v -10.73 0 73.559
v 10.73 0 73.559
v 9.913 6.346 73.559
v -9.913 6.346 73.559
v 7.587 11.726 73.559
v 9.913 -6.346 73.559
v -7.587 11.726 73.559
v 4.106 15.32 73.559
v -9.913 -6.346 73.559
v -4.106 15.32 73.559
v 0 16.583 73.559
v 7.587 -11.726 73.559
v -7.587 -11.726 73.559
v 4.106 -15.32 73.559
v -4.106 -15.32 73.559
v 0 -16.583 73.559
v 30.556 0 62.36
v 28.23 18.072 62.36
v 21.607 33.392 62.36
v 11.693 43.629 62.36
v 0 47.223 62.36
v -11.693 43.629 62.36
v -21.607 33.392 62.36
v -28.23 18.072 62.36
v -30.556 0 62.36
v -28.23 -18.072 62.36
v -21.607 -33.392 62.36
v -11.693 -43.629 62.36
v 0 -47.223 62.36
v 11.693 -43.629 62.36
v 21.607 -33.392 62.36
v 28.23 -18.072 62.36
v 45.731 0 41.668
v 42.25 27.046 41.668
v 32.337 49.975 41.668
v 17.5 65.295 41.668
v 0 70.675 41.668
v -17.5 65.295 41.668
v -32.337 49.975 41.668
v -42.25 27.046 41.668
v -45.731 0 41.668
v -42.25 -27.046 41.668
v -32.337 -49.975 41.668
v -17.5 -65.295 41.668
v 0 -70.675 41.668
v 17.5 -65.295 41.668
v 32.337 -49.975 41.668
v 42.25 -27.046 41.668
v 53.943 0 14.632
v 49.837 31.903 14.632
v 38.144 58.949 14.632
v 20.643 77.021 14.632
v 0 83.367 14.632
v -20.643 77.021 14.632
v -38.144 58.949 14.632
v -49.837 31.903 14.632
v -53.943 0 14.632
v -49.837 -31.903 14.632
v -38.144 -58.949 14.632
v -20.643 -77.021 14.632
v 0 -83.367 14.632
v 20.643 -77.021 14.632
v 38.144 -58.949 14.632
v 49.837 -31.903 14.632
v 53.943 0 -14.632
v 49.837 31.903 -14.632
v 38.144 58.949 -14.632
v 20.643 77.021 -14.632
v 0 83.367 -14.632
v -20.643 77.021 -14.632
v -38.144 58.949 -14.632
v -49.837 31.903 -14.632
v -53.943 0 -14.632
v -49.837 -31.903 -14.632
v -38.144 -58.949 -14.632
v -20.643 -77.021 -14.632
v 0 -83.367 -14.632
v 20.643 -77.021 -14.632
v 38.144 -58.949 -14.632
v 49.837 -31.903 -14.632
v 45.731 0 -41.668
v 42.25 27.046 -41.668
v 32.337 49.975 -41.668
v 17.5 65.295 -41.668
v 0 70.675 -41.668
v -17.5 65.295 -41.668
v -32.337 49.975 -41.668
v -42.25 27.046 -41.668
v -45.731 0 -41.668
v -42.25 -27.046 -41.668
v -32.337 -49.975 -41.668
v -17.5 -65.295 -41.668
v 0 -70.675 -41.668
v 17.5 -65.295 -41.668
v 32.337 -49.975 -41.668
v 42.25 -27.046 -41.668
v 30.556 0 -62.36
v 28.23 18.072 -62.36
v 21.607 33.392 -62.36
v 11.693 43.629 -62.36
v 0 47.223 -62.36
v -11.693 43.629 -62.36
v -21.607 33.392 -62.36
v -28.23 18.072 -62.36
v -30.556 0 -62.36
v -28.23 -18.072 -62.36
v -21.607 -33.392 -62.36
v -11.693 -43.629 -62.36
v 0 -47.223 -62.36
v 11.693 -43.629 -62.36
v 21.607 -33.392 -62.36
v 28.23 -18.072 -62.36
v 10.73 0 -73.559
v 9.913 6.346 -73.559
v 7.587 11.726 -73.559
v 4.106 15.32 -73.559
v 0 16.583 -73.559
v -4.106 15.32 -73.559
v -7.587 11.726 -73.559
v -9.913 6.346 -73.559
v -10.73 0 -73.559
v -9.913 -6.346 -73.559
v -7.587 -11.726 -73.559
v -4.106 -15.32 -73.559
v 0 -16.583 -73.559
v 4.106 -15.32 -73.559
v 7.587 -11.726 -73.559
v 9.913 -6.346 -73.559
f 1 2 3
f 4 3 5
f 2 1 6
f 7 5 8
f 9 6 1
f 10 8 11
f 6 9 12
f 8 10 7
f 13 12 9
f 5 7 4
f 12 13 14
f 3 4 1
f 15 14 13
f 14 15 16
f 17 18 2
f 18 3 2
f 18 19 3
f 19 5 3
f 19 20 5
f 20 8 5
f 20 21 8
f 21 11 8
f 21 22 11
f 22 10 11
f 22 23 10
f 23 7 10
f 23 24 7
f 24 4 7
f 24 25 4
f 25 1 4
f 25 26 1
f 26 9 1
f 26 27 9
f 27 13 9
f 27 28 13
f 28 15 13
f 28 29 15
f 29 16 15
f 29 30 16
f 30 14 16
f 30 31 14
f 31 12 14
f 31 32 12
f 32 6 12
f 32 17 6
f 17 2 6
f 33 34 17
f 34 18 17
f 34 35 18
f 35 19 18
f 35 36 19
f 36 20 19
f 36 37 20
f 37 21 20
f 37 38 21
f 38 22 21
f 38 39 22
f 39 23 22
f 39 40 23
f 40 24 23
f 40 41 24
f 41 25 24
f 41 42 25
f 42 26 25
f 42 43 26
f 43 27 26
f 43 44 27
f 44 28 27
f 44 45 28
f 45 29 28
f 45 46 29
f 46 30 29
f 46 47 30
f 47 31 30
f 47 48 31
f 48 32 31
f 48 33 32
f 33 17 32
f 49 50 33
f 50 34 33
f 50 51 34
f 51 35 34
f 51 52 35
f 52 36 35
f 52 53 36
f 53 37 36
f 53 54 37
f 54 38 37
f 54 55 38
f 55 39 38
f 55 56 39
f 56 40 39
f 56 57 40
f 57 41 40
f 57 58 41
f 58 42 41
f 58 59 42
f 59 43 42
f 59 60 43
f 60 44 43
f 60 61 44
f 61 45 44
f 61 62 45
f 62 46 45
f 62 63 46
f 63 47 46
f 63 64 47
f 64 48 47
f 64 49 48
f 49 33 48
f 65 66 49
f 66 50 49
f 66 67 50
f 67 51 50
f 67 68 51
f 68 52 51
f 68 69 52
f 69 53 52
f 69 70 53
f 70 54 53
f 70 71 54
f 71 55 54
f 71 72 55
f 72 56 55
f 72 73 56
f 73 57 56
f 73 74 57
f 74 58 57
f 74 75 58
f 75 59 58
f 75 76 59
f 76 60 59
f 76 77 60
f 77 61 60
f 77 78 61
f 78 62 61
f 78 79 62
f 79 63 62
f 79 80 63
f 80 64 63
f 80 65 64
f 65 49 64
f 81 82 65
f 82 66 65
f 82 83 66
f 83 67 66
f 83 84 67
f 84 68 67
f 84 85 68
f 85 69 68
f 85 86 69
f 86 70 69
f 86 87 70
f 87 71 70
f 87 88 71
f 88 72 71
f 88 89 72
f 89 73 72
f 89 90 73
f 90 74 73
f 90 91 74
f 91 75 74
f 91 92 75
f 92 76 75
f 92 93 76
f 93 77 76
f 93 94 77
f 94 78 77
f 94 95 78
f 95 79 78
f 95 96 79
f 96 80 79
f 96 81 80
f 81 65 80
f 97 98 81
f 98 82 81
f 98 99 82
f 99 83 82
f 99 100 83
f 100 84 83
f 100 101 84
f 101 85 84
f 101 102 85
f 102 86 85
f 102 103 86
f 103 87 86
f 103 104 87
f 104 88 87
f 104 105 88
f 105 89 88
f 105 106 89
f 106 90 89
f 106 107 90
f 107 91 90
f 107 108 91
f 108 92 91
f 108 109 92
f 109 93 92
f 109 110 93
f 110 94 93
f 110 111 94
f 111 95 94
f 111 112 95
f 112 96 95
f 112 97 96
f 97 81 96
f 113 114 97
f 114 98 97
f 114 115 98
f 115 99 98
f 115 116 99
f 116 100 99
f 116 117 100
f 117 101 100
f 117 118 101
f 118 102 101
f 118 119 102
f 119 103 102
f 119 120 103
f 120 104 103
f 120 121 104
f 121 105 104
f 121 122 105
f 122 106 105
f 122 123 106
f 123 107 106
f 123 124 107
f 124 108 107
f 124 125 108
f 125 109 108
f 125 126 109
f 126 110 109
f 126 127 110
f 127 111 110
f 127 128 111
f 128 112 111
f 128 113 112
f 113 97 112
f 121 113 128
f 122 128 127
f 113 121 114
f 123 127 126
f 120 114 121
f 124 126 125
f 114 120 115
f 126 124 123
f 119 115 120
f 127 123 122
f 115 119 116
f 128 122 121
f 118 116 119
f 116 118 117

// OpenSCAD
// Generated by SolidPython 1.0.1 on 2020-07-29 00:46:50


scale(v = [11, 17, 15]) {
	sphere(r = 5);
}
/***********************************************
*********      SolidPython code:      **********
************************************************
 
# import packages: SolidPython
from solid import *
from solid.utils import *
from itertools import chain, combinations, permutations


class Resize:

    def __init__(self, scad_file):
        self.scad_file = scad_file
        #self.scad_file = import_scad(scad_file)
        # cone/cylinder param:
        self.r1 = 0
        self.r2 = 0
        self.h = 0
        # rectangular prism param:
        self.w = 0
        self.l = 0
        # ellipse param:
        self.r = 0

    # import OpenScad code (file name corresponds to shape)


    # classify shape + parameters
    def assign(self, param1, param2, param3):
        if self.scad_file == 'cone.scad':
            self.r1 = param1
            self.r2 = param2
            self.h = param3
        elif self.scad_file == 'cylinder.scad':
            self.r1 = param1
            self.r2 = param2
            self.h = param3
        elif self.scad_file == 'rectangularPrism.scad':
            self.h = param1
            self.l = param2
            self.w = param3
        else:
            self.r = param1
            self.h = param2

    # resize parameters
    def iterate(self):
        x = range(3, 20, 2)
        i = 1
        if self.scad_file == 'cone.scad':
            tempList = list(permutations(x, 2))
            for temp in tempList:
                param1 = temp[0]
                param2 = temp[1]
                filepath = 'produced_scad_files/' + 'cone' + str(param1) + '_' + str(param2) + '_' + '.scad'
                scad_render_to_file(cylinder(h=param1, r1=param2, r2=0), filepath)

        elif self.scad_file == 'cylinder.scad':
            tempList = list(permutations(x, 3))
            for temp in tempList:
                param1 = temp[0]
                param2 = temp[1]
                filepath = 'produced_scad_files/' + 'cylinder' + str(param1) + '_' + str(param2) + '_' + '.scad'
                scad_render_to_file(cylinder(h=param1, r1=param2, r2=param2), filepath)

        elif self.scad_file == 'rectangularPrism.scad':
            tempList = list(permutations(x, 3))
            for temp in tempList:
                param1 = temp[0]
                param2 = temp[1]
                param3 = temp[2]
                filepath = 'produced_scad_files/' + 'rectangularPrism' + str(param1) + '_' + str(param2) + '_' + str(
                    param3) + '.scad'
                scad_render_to_file(cube(size=(param1, param2, param3)), filepath)

        elif self.scad_file == 'ellipse.scad':
            tempList = list(permutations(x, 4))
            for temp in tempList:
                param1 = temp[0]
                param2 = temp[1]
                param3 = temp[2]
                param4 = temp[3]
                filepath = 'produced_scad_files/' + 'ellipse' + str(param1) + '_' + str(param2) + '_' + str(param3) + '_' + str(param4) + '.scad'
                scad_render_to_file(scale([param1, param2, param3])(sphere(r=param4)), filepath)

    def render_to_scadfile(self):
        scad_render_to_file(scad, 'example.scad') 
 
************************************************/
